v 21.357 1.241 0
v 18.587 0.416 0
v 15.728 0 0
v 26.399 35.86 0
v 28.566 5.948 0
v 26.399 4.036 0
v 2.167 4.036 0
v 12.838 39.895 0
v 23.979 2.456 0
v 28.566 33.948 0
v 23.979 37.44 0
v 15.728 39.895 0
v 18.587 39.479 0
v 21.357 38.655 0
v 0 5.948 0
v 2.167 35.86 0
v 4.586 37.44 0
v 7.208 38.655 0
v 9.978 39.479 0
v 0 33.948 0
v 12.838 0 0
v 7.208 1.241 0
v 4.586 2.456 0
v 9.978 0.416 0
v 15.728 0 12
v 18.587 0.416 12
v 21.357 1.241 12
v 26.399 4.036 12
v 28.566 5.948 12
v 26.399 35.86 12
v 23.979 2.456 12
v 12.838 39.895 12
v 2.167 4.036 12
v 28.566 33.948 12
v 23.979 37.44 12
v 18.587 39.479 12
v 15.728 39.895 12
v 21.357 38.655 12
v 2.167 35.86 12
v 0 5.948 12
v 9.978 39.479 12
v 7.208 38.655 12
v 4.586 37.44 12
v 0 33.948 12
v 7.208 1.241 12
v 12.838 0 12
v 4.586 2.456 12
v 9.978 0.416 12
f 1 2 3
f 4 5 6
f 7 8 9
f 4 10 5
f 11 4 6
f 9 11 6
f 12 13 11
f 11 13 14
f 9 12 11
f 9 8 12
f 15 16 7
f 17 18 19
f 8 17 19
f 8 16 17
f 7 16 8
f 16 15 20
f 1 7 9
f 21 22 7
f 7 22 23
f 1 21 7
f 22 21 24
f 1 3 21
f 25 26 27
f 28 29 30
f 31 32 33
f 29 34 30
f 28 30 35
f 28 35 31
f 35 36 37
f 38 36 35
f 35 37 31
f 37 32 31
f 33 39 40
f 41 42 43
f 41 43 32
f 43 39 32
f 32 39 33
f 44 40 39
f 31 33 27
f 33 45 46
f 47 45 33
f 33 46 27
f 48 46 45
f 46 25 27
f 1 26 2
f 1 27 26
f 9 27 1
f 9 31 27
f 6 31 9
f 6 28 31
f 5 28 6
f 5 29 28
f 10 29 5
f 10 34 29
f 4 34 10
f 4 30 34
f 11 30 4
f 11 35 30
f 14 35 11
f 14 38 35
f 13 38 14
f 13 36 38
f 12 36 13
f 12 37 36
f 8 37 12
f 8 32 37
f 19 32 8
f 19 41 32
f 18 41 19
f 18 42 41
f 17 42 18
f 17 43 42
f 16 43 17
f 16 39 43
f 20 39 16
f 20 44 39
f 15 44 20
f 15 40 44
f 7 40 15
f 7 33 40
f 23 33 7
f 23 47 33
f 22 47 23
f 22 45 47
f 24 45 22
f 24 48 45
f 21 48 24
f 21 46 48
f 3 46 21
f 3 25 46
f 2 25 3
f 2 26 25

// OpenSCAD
$fn = 32;

// ----------------------------------------------------------------------
// Eccentric disc: double_d, 12 mm thick
// ----------------------------------------------------------------------

// --- parameters (mm) ---
profile_height = 12;      // extrusion height
profile_points = 24;      // points of the closed outline

profile = [[28.566, 33.948], [26.399, 35.86], [23.979, 37.44], [21.357, 38.655], [18.587, 39.479], [15.728, 39.895], [12.838, 39.895], [9.978, 39.479], [7.208, 38.655], [4.586, 37.44], [2.167, 35.86], [0, 33.948], [0, 5.948], [2.167, 4.036], [4.586, 2.456], [7.208, 1.241], [9.978, 0.416], [12.838, 0], [15.728, 0], [18.587, 0.416], [21.357, 1.241], [23.979, 2.456], [26.399, 4.036], [28.566, 5.948]];  // single closed polygon, 24 points, counter clockwise

// --- the one profile operation ---
linear_extrude(height = profile_height) polygon(points = profile);
